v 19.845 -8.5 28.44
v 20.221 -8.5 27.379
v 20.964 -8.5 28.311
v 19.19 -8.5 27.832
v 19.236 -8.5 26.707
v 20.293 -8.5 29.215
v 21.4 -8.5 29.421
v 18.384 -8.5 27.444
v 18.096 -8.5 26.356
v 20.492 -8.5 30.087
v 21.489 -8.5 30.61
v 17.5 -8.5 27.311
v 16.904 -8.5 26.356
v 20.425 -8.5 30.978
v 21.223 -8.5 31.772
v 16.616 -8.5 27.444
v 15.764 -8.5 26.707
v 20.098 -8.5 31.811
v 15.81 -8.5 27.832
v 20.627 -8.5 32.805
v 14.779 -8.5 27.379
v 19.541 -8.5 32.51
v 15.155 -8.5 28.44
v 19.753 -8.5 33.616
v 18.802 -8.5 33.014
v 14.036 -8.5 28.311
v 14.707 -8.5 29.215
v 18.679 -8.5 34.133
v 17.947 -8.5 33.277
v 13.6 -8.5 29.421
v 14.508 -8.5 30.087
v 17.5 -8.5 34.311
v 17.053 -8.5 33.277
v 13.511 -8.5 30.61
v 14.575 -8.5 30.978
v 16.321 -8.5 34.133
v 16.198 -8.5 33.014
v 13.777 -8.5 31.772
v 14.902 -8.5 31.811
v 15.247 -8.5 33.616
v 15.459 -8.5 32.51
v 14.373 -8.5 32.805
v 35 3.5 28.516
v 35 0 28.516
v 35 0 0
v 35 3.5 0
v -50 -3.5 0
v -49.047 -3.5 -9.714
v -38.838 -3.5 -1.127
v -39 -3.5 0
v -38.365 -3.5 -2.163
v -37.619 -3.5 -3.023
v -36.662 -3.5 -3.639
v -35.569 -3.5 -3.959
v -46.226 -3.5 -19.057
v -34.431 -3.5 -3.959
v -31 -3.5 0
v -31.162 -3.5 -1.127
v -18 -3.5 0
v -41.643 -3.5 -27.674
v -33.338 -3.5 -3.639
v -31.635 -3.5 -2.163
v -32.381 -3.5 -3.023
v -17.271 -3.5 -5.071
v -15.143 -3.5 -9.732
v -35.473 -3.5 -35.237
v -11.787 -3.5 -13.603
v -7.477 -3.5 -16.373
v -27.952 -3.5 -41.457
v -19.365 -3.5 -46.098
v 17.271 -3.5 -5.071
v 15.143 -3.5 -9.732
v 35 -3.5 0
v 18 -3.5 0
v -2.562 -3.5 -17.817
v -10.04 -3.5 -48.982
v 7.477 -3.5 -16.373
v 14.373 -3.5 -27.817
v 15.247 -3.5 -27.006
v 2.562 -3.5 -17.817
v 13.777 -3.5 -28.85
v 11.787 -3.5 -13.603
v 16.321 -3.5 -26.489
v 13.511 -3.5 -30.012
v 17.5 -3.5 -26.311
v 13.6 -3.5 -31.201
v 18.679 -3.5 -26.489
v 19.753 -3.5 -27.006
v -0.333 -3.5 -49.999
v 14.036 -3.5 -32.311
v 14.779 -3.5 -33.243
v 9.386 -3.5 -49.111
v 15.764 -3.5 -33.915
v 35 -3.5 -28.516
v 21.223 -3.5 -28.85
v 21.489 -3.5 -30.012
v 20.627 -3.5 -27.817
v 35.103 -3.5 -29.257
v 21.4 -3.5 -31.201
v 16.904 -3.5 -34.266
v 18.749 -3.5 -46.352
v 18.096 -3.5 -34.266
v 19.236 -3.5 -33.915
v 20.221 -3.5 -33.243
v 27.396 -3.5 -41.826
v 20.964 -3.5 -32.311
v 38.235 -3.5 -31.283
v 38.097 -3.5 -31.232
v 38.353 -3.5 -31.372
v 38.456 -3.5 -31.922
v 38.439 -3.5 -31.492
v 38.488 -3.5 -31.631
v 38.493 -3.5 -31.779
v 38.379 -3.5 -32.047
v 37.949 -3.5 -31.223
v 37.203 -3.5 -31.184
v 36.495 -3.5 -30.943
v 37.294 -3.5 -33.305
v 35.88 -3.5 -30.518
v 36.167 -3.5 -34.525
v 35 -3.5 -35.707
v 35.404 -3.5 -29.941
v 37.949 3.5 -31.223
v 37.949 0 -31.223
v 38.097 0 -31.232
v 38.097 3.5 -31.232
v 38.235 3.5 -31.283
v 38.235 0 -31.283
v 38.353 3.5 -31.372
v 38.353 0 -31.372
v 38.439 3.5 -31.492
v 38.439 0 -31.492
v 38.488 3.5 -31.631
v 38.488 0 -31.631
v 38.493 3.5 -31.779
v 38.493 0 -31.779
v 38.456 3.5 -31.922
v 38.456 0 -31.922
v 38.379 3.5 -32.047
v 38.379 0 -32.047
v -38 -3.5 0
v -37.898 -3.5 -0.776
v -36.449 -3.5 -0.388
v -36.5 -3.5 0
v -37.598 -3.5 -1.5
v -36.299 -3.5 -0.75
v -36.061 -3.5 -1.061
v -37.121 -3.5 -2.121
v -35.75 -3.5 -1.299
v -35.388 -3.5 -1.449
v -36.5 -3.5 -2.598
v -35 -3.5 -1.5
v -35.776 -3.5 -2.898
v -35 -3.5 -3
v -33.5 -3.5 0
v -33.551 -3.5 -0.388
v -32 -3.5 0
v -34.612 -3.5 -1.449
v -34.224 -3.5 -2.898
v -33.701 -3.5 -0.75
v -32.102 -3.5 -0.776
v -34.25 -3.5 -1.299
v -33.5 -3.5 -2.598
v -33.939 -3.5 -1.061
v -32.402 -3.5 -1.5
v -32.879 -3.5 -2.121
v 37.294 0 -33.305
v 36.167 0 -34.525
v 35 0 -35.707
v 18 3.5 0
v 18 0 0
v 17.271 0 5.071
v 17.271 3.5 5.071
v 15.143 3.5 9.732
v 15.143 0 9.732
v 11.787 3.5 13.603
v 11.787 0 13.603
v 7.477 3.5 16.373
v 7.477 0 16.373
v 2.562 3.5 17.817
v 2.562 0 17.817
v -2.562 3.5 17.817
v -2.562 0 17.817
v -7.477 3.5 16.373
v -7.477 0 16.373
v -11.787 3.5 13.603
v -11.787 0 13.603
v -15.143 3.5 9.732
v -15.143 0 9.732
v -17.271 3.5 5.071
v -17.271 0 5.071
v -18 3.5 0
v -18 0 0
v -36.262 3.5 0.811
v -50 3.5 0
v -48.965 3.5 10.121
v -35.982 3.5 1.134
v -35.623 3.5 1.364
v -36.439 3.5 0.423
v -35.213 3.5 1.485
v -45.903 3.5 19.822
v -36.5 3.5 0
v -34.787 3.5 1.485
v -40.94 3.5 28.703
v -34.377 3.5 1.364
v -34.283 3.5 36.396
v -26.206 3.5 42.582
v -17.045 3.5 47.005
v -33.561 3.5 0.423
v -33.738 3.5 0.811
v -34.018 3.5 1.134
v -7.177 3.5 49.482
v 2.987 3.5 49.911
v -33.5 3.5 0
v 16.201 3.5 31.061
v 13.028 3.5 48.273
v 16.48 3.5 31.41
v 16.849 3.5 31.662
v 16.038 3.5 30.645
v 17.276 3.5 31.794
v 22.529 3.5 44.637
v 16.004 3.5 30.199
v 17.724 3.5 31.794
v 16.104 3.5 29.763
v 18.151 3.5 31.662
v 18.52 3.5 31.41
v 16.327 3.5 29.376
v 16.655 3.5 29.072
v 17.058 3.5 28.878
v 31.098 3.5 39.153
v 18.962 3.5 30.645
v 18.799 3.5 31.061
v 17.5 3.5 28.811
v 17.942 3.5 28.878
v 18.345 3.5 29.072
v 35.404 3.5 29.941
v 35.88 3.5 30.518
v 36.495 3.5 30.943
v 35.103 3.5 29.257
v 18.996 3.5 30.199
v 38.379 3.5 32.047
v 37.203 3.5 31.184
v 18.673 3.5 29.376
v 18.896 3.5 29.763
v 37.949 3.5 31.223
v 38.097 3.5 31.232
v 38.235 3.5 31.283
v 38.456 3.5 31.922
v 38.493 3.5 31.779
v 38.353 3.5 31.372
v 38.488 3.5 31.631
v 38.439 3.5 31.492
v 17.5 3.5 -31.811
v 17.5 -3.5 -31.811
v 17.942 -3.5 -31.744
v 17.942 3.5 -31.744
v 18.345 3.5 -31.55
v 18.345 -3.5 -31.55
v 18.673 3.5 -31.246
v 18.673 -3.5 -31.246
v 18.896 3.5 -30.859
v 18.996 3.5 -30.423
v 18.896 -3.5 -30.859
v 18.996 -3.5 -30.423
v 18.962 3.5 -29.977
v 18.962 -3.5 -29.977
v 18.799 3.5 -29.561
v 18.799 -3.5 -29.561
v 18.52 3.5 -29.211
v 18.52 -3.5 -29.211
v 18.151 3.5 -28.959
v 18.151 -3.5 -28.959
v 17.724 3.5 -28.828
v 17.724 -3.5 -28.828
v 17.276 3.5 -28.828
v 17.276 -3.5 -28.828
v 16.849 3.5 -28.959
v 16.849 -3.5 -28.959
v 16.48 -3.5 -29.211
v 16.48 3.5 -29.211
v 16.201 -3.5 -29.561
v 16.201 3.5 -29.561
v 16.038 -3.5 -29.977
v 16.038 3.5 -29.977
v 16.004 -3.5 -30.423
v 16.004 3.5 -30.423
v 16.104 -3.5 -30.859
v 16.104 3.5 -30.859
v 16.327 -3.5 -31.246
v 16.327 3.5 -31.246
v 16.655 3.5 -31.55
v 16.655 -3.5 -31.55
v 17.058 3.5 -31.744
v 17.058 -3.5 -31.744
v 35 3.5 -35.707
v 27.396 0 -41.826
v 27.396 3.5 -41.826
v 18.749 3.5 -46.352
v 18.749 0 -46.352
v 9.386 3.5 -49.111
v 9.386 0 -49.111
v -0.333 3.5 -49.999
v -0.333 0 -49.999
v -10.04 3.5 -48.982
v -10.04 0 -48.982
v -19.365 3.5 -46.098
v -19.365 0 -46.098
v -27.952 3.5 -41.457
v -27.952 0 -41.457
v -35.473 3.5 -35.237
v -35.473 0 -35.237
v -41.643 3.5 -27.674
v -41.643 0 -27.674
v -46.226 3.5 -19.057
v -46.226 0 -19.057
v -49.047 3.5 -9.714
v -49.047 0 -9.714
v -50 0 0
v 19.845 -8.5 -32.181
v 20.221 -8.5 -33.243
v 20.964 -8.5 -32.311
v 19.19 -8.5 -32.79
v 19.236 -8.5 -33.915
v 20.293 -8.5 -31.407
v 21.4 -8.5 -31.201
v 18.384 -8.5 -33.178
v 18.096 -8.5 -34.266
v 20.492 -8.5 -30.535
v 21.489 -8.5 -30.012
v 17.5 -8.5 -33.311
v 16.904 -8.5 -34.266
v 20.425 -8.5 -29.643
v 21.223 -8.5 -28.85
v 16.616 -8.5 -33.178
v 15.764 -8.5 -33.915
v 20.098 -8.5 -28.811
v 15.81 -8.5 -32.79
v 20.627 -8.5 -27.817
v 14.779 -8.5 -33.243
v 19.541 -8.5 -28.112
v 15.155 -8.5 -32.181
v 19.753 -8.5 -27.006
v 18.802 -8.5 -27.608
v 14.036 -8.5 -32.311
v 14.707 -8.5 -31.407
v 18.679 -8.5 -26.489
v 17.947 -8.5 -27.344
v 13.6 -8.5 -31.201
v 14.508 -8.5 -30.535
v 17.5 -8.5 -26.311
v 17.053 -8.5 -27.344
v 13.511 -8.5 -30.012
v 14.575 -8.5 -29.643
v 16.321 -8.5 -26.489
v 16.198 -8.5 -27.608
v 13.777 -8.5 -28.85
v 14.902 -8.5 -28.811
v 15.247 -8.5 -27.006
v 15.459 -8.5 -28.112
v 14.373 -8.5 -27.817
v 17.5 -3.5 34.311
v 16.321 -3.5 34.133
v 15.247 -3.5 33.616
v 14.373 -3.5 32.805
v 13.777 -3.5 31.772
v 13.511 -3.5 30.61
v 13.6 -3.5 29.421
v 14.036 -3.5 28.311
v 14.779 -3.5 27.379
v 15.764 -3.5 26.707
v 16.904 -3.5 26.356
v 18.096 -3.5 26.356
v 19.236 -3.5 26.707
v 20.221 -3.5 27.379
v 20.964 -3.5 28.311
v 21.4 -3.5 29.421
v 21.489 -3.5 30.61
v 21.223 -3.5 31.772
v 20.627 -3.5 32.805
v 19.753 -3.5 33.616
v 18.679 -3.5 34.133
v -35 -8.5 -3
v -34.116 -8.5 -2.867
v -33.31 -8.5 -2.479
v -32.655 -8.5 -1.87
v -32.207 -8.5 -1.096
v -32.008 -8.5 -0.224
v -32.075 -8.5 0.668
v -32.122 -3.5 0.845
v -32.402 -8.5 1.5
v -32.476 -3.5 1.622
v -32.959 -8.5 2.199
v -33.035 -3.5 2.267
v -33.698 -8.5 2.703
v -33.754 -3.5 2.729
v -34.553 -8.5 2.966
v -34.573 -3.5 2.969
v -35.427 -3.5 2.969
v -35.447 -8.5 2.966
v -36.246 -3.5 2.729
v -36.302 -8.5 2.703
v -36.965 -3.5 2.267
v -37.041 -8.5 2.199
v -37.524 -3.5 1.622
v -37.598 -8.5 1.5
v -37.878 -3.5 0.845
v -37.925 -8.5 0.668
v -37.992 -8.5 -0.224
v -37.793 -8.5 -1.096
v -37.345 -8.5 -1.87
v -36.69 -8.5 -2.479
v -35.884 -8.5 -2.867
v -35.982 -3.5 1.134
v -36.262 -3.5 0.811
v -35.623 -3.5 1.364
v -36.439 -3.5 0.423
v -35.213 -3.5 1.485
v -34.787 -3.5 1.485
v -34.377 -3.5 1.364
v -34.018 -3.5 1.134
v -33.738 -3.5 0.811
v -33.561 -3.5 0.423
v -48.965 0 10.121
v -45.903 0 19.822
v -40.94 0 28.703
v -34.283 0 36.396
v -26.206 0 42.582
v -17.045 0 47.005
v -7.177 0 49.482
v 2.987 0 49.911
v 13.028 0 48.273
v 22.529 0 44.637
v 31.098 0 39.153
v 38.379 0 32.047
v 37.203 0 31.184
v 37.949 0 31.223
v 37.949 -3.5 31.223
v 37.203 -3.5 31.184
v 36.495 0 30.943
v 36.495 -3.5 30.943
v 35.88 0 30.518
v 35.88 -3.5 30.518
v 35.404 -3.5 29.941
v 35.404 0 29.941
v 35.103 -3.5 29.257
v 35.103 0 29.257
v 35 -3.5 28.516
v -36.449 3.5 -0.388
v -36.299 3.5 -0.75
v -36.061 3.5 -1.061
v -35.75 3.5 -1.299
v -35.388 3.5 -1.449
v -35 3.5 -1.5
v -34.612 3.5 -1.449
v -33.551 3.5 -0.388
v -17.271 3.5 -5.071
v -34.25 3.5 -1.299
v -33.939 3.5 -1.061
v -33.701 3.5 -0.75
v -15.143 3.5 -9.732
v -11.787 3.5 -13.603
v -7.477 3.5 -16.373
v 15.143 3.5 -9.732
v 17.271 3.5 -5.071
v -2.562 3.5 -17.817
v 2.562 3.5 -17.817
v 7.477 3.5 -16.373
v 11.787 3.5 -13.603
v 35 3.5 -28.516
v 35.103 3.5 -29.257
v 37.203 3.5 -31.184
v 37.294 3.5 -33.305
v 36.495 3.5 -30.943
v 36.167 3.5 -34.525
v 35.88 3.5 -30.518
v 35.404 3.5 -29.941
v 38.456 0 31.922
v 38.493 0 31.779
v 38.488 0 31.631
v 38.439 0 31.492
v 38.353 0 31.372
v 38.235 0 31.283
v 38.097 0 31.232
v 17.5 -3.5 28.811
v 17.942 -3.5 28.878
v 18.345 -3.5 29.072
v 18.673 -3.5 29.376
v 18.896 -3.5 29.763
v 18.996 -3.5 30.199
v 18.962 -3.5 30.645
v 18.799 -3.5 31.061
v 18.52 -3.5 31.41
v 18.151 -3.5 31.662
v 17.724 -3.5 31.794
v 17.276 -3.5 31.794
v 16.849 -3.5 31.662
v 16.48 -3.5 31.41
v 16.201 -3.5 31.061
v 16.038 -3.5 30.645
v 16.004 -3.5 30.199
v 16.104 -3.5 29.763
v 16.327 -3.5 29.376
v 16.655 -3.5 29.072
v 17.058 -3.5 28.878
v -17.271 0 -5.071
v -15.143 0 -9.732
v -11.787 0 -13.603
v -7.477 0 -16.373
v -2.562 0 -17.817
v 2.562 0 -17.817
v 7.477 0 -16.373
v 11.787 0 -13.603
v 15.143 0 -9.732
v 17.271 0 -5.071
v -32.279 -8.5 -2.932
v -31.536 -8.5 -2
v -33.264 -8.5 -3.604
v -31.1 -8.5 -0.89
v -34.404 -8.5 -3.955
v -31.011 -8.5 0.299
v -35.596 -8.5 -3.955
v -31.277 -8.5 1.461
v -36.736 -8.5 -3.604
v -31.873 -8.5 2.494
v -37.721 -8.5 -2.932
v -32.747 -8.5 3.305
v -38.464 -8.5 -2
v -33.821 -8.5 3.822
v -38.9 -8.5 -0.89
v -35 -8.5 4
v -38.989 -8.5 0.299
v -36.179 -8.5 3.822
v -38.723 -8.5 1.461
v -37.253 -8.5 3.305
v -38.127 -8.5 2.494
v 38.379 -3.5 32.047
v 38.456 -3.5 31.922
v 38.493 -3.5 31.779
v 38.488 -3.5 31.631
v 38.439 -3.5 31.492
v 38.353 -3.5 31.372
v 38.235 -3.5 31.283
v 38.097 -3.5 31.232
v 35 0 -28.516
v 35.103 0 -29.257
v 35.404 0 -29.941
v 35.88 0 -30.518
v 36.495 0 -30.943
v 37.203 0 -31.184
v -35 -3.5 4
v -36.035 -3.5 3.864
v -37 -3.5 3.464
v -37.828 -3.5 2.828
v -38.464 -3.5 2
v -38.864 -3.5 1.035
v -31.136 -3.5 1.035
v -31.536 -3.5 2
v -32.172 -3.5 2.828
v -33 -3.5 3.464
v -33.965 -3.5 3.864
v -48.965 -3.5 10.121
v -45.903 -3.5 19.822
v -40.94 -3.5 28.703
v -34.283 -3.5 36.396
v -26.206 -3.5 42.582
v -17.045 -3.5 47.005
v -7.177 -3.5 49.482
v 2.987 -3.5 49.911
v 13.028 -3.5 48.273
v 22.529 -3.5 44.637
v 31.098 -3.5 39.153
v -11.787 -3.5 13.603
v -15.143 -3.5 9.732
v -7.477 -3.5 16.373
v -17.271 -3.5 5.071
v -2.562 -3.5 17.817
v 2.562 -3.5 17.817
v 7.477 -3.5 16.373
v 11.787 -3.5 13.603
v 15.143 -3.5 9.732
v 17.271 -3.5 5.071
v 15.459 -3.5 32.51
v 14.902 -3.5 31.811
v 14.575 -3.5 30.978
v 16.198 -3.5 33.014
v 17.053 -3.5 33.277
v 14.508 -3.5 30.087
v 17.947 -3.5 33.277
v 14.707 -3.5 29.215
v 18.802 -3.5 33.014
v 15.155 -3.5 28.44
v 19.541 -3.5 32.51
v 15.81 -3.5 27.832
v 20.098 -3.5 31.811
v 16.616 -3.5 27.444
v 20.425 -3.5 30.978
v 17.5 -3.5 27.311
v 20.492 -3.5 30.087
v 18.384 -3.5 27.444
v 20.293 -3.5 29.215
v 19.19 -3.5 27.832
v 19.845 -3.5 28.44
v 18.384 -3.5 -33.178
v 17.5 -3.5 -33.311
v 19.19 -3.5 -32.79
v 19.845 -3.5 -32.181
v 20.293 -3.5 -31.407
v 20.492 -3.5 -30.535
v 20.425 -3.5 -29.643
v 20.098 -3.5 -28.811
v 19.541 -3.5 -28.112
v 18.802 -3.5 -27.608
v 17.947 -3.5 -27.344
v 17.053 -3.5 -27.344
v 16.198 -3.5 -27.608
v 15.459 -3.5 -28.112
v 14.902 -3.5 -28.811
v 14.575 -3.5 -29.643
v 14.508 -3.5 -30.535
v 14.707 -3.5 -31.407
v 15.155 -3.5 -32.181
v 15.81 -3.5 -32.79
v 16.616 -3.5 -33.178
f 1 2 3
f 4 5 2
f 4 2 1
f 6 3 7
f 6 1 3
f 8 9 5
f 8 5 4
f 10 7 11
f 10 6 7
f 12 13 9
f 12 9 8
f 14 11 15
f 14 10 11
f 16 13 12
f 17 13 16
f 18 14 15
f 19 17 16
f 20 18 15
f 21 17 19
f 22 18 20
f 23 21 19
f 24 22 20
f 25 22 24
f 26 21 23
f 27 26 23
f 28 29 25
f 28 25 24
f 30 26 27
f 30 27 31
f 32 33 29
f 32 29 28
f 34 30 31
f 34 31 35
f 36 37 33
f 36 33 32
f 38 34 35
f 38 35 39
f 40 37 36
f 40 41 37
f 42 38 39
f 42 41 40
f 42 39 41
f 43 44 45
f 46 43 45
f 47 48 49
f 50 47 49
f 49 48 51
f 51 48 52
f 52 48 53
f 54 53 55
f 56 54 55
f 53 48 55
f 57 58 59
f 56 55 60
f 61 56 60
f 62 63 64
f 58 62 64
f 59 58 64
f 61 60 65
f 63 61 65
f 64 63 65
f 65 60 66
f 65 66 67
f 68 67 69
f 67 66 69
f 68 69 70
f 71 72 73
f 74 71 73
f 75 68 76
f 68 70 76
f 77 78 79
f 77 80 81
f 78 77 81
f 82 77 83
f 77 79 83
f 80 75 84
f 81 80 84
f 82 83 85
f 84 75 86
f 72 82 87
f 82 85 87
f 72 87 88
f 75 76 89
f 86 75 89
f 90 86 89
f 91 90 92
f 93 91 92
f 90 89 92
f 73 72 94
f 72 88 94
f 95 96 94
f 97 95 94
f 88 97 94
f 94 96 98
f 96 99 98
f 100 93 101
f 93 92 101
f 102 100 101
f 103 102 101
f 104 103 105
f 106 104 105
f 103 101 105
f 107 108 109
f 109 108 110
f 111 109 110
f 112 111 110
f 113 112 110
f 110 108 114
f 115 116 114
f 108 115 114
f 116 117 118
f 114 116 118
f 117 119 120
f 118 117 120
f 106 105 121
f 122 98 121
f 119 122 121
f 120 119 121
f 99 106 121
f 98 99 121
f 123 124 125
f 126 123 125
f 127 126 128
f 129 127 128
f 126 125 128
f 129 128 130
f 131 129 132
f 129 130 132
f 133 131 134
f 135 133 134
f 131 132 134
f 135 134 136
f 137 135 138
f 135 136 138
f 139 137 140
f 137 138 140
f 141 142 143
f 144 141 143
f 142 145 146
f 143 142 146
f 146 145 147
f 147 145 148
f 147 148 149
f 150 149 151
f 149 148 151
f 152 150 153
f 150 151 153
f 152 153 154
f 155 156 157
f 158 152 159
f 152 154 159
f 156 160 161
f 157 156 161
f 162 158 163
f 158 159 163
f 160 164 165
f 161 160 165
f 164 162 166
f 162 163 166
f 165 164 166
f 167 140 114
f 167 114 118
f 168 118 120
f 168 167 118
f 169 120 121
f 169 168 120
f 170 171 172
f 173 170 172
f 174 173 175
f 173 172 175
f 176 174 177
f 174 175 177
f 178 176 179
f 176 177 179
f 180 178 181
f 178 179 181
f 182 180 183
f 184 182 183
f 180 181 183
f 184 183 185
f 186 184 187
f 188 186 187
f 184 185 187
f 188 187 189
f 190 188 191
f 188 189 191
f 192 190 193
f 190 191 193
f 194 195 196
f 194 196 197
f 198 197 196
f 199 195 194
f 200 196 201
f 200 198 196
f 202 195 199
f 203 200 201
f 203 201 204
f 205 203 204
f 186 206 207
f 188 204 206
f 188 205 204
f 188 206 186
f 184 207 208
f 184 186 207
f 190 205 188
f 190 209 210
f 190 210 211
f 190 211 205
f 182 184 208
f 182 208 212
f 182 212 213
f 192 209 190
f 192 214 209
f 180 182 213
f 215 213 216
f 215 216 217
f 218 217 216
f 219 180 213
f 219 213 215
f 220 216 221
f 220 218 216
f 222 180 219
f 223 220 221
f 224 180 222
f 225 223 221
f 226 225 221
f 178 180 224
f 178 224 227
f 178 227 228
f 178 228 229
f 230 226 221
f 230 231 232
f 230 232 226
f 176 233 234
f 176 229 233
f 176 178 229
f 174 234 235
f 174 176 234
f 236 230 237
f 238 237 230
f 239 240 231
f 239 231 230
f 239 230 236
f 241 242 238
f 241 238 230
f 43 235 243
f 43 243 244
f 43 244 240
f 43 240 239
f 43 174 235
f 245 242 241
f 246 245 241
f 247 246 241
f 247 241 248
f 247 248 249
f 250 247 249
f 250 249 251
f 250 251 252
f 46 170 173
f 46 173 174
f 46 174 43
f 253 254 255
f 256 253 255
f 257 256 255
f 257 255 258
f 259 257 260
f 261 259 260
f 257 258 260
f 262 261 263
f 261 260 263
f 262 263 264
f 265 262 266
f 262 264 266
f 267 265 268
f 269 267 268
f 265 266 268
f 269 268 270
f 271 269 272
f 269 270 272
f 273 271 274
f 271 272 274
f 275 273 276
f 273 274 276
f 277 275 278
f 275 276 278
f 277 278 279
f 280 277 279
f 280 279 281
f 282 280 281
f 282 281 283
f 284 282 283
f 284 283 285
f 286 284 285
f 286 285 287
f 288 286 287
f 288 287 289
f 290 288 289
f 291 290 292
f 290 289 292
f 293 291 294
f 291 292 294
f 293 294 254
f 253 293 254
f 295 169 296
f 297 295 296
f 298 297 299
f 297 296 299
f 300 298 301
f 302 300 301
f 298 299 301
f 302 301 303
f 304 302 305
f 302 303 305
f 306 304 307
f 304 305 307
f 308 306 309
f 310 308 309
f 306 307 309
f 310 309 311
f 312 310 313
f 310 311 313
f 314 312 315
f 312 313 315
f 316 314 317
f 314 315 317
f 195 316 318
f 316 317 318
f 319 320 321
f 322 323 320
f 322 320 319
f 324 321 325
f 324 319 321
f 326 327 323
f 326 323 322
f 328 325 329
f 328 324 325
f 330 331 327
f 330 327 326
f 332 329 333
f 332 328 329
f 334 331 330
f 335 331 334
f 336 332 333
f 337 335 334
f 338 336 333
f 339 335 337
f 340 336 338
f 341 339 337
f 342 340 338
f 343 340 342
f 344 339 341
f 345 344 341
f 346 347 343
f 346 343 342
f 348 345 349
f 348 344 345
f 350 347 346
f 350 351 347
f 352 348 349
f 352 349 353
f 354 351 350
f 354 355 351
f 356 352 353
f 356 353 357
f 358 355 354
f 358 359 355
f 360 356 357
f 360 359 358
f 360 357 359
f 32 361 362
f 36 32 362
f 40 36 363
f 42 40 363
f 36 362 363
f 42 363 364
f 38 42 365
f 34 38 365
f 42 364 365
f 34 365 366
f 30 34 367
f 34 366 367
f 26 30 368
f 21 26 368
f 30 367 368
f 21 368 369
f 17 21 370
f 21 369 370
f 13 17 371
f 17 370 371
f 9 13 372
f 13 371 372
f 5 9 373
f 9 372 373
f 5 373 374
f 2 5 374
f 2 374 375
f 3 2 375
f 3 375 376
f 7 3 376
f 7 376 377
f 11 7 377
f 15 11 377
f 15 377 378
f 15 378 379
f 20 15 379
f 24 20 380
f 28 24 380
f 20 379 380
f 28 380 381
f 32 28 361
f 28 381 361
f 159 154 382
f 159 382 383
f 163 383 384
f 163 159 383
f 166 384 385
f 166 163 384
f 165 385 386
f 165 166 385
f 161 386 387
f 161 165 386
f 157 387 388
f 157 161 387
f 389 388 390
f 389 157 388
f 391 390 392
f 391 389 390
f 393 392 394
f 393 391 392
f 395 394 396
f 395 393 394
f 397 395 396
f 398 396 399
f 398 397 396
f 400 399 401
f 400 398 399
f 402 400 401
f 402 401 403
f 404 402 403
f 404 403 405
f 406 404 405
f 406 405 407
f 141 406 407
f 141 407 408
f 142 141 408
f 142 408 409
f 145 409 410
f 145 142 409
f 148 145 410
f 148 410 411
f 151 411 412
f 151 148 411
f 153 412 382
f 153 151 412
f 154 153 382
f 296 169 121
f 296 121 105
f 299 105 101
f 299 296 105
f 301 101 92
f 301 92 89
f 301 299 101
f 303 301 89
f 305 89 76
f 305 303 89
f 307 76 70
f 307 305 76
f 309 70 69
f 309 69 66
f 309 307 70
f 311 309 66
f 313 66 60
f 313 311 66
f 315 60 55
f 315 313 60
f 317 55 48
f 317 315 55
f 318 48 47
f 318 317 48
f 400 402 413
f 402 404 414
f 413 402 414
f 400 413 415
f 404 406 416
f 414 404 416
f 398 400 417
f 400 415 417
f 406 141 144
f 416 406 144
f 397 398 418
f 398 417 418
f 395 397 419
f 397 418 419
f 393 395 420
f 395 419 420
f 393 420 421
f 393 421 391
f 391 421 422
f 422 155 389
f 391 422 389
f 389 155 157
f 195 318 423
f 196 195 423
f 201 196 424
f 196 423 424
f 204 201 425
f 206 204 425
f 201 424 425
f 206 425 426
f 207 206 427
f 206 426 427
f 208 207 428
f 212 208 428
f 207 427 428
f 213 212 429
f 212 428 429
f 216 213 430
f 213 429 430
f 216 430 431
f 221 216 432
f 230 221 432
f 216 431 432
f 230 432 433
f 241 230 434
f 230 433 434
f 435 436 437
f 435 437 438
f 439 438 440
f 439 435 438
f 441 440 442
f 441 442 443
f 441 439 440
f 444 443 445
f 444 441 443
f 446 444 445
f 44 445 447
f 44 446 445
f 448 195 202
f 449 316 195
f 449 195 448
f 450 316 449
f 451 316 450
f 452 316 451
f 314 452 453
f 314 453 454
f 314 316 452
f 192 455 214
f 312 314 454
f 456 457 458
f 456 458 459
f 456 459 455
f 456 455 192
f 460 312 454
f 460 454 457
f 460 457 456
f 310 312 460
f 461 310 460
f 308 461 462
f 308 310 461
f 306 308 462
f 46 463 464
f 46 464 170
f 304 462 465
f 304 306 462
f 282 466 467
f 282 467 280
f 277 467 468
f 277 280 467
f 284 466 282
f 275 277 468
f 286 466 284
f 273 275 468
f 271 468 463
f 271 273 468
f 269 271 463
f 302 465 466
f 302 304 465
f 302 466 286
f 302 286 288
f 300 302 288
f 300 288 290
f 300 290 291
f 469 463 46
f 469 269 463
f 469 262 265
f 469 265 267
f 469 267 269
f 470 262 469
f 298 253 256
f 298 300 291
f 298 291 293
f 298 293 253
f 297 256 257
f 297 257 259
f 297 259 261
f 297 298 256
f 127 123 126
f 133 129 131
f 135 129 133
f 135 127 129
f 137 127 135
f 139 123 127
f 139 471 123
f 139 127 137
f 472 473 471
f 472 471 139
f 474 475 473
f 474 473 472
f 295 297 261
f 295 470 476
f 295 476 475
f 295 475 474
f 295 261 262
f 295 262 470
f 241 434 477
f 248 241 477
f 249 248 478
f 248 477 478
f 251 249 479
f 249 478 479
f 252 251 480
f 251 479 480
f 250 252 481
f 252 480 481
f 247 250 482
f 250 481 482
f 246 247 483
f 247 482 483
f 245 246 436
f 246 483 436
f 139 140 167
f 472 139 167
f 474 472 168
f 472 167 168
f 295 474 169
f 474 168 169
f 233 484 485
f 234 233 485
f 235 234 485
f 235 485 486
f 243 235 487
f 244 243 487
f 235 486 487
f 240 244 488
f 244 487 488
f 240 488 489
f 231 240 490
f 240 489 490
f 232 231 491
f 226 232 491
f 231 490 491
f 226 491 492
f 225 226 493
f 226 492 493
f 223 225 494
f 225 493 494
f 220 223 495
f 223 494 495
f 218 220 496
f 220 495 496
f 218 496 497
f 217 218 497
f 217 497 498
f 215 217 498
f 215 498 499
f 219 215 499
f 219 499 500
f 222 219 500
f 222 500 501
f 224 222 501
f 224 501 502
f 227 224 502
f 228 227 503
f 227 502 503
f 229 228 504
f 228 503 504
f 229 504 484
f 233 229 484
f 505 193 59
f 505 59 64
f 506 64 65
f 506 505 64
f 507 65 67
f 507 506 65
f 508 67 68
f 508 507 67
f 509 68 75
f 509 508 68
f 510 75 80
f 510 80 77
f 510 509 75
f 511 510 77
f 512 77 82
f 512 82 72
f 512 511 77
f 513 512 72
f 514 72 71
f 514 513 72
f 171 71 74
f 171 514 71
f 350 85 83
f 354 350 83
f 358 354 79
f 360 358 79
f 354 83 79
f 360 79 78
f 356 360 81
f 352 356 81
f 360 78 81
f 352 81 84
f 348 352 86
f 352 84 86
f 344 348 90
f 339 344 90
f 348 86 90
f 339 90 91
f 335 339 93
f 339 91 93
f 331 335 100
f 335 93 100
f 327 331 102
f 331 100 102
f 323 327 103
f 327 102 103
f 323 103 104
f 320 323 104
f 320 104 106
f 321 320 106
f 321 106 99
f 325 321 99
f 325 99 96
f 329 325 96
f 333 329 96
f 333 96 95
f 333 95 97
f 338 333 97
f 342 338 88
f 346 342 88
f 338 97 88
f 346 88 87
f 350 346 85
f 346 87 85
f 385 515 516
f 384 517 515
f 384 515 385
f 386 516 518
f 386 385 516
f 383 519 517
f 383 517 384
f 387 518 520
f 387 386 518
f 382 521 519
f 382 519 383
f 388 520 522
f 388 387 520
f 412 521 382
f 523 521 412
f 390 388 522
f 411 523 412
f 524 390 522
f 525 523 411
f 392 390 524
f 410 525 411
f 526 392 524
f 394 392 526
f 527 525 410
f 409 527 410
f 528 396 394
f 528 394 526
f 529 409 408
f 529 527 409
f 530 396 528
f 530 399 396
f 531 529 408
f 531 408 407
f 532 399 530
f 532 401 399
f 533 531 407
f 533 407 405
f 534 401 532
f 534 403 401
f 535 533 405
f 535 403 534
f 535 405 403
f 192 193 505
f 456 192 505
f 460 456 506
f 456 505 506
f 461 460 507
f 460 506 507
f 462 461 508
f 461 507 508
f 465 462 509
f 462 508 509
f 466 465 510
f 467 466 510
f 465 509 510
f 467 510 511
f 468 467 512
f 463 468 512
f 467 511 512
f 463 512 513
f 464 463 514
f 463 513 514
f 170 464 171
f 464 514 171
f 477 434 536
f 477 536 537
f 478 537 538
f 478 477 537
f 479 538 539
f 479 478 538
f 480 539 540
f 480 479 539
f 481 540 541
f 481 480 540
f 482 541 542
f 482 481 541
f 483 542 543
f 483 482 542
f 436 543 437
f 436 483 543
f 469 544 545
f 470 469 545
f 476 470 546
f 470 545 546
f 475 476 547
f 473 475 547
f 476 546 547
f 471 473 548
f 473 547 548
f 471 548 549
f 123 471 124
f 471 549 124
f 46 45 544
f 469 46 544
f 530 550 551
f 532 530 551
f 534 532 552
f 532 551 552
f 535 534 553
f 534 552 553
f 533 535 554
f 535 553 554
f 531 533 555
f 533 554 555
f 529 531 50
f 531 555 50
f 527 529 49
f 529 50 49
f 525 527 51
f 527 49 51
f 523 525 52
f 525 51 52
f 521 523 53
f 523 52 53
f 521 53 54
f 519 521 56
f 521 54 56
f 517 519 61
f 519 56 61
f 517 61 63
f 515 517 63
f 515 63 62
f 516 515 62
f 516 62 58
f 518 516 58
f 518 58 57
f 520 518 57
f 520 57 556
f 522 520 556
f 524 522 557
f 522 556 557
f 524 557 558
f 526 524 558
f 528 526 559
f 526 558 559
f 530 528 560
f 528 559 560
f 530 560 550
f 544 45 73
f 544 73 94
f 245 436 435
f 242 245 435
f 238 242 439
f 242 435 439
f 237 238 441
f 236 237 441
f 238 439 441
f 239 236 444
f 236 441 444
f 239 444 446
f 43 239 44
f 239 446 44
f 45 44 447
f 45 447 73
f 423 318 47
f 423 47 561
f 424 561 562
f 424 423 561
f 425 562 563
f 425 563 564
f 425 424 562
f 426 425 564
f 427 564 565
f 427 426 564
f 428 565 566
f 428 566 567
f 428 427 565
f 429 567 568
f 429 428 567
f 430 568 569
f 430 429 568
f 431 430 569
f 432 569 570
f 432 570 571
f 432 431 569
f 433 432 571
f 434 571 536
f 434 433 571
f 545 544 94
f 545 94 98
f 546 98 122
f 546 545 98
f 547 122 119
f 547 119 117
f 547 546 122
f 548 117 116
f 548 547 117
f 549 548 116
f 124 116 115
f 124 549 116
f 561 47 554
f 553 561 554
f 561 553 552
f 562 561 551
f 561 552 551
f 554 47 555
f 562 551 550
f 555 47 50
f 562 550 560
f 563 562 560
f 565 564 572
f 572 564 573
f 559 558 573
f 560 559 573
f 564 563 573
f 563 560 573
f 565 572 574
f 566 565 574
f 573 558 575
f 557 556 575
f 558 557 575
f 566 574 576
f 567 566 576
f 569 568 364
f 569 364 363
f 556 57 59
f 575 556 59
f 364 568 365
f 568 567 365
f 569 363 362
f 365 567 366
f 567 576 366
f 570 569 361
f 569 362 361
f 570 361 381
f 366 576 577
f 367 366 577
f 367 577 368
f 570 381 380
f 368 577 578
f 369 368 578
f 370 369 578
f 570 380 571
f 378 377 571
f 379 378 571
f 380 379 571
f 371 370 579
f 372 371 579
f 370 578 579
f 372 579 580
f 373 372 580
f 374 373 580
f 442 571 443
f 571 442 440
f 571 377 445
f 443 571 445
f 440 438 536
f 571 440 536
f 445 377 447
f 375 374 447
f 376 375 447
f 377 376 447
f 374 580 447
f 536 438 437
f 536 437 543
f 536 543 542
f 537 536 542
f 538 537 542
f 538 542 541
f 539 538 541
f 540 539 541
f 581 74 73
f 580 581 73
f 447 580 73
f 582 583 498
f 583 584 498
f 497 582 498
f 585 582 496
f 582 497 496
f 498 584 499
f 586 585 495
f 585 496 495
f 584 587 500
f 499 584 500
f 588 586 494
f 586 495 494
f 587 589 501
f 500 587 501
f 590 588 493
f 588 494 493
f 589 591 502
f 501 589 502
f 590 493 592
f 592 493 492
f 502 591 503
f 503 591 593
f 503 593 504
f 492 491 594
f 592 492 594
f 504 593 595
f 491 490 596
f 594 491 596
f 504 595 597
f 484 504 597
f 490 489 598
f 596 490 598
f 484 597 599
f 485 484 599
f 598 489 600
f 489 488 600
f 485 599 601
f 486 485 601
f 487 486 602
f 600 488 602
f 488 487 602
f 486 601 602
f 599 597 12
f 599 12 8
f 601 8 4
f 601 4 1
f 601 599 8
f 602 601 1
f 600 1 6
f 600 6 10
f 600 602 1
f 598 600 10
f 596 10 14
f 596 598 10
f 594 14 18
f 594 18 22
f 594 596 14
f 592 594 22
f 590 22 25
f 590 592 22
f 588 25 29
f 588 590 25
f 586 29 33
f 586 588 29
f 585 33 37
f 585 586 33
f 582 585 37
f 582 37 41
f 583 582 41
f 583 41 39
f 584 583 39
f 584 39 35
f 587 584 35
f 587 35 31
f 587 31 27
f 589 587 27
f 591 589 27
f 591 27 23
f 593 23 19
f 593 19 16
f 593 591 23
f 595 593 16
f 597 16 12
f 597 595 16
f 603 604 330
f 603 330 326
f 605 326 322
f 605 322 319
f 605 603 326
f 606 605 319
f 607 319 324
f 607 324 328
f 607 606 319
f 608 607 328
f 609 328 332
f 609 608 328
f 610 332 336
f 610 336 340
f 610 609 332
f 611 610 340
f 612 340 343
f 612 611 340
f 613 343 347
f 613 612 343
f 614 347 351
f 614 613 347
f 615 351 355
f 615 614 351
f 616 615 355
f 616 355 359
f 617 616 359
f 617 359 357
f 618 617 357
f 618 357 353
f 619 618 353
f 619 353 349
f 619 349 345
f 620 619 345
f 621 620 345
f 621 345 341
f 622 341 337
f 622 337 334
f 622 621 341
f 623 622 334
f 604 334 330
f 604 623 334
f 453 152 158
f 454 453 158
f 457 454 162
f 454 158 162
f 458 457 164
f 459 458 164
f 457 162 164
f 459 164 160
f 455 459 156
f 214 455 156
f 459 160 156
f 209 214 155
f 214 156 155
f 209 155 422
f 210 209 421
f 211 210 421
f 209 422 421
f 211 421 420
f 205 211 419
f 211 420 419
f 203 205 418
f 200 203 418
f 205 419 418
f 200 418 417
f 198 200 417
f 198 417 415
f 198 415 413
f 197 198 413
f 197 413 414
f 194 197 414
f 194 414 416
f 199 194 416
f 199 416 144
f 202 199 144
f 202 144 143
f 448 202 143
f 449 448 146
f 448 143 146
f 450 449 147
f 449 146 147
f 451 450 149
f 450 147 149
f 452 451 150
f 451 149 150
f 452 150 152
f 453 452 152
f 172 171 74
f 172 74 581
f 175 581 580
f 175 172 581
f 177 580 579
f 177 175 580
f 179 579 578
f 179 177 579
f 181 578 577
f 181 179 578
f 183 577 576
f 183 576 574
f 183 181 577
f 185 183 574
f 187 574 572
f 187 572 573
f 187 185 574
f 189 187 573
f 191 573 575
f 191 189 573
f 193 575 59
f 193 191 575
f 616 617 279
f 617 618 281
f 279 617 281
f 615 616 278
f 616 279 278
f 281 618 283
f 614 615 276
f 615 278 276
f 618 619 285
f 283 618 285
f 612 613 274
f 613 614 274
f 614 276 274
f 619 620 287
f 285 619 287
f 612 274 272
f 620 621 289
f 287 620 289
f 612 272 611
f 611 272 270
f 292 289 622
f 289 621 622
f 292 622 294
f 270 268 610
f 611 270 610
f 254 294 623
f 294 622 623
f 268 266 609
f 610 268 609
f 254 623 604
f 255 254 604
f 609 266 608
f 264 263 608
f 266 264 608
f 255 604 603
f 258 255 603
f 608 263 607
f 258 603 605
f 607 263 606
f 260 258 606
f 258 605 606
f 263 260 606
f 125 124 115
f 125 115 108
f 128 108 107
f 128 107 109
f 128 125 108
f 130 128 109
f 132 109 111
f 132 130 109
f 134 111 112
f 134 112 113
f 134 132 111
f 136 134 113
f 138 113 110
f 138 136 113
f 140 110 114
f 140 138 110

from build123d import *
from build123d.topology import SkipClean

# Parameters (mm, degrees)
SALIENTE_EXTRUIR1_DEPTH = 3.5
CROQUIS2_R              = 1.5
CORTAR_EXTRUIR1_DEPTH   = 7
CROQUIS3_R              = 4
CROQUIS3_R_2            = 3
SALIENTE_EXTRUIR2_DEPTH = 5


with BuildPart() as part:
    # Croquis1 → Saliente-Extruir1 (new, symmetric)
    with SkipClean():  # the faces are left unmerged after this step: merging them gives an invalid solid
        with BuildSketch(Plane(origin=(0, 0, 0), x_dir=(1, 0, 0), z_dir=(0, 1, 0))):
            with BuildLine():
                Line((35, 0), (18, 0))
                ThreePointArc((18, 0), (0, -18), (-18, 0))
                Line((-18, 0), (-50, 0))
                ThreePointArc((-50, 0), (-17.044661679, -47.005100875), (38.37918033, -32.047441664))
                ThreePointArc((38.37918033, -32.047441664), (38.439227262, -31.49182987), (37.949409202, -31.222779006))
                ThreePointArc((37.949409202, -31.222779006), (35.879823326, -30.517678888), (35, -28.516113802))
                Line((35, -28.516113802), (35, 0))
            make_face()
            with BuildLine():
                ThreePointArc((-18, 0), (0, 18), (18, 0))
                Line((18, 0), (35, 0))
                Line((35, 0), (35, 28.516113802))
                ThreePointArc((35, 28.516113802), (35.879823326, 30.517678888), (37.949409202, 31.222779006))
                ThreePointArc((37.949409202, 31.222779006), (38.439227262, 31.49182987), (38.37918033, 32.047441664))
                ThreePointArc((38.37918033, 32.047441664), (36.735192641, 33.919398898), (35, 35.707142143))
                ThreePointArc((35, 35.707142143), (-19.364916731, 46.097722286), (-50, 0))
                Line((-50, 0), (-18, 0))
            make_face()
        extrude(amount=SALIENTE_EXTRUIR1_DEPTH, both=True)

    # Croquis2 → Cortar-Extruir1 (cut)
    with SkipClean():  # the faces are left unmerged after this step: merging them gives an invalid solid
        with BuildSketch(Plane.XZ.offset(3.5)):
            with Locations(Location((17.5, 30.310889132, 0), (0, 0, 270))):
                Circle(CROQUIS2_R)
            with Locations(Location((-35, 0, 0), (0, 0, 270))):
                Circle(CROQUIS2_R)
            with Locations(Location((17.5, -30.310889132, 0), (0, 0, 270))):
                Circle(CROQUIS2_R)
        extrude(amount=-CORTAR_EXTRUIR1_DEPTH, mode=Mode.SUBTRACT)

    # Croquis3 → Saliente-Extruir2 (add)
    # profile 1 of 3: a face of its own
    with SkipClean():  # the faces are left unmerged after this step: merging them gives an invalid solid
        with BuildSketch(Plane.XZ.offset(3.5)):
            with Locations(Location((-35, 0, 0), (0, 0, 90))):
                Circle(CROQUIS3_R)
            with Locations(Location((-35, 0, 0), (0, 0, 270))):
                Circle(CROQUIS3_R_2, mode=Mode.SUBTRACT)
        # profile 2 of 3: a face of its own
        with BuildSketch(Plane.XZ.offset(3.5)):
            with Locations(Location((17.5, 30.310889132, 0), (0, 0, 90))):
                Circle(CROQUIS3_R)
            with Locations(Location((17.5, 30.310889132, 0), (0, 0, 270))):
                Circle(CROQUIS3_R_2, mode=Mode.SUBTRACT)
        # profile 3 of 3: a face of its own
        with BuildSketch(Plane.XZ.offset(3.5)):
            with Locations(Location((17.5, -30.310889132, 0), (0, 0, 90))):
                Circle(CROQUIS3_R)
            with Locations(Location((17.5, -30.310889132, 0), (0, 0, 270))):
                Circle(CROQUIS3_R_2, mode=Mode.SUBTRACT)
        extrude(amount=SALIENTE_EXTRUIR2_DEPTH)


solid = part.part
